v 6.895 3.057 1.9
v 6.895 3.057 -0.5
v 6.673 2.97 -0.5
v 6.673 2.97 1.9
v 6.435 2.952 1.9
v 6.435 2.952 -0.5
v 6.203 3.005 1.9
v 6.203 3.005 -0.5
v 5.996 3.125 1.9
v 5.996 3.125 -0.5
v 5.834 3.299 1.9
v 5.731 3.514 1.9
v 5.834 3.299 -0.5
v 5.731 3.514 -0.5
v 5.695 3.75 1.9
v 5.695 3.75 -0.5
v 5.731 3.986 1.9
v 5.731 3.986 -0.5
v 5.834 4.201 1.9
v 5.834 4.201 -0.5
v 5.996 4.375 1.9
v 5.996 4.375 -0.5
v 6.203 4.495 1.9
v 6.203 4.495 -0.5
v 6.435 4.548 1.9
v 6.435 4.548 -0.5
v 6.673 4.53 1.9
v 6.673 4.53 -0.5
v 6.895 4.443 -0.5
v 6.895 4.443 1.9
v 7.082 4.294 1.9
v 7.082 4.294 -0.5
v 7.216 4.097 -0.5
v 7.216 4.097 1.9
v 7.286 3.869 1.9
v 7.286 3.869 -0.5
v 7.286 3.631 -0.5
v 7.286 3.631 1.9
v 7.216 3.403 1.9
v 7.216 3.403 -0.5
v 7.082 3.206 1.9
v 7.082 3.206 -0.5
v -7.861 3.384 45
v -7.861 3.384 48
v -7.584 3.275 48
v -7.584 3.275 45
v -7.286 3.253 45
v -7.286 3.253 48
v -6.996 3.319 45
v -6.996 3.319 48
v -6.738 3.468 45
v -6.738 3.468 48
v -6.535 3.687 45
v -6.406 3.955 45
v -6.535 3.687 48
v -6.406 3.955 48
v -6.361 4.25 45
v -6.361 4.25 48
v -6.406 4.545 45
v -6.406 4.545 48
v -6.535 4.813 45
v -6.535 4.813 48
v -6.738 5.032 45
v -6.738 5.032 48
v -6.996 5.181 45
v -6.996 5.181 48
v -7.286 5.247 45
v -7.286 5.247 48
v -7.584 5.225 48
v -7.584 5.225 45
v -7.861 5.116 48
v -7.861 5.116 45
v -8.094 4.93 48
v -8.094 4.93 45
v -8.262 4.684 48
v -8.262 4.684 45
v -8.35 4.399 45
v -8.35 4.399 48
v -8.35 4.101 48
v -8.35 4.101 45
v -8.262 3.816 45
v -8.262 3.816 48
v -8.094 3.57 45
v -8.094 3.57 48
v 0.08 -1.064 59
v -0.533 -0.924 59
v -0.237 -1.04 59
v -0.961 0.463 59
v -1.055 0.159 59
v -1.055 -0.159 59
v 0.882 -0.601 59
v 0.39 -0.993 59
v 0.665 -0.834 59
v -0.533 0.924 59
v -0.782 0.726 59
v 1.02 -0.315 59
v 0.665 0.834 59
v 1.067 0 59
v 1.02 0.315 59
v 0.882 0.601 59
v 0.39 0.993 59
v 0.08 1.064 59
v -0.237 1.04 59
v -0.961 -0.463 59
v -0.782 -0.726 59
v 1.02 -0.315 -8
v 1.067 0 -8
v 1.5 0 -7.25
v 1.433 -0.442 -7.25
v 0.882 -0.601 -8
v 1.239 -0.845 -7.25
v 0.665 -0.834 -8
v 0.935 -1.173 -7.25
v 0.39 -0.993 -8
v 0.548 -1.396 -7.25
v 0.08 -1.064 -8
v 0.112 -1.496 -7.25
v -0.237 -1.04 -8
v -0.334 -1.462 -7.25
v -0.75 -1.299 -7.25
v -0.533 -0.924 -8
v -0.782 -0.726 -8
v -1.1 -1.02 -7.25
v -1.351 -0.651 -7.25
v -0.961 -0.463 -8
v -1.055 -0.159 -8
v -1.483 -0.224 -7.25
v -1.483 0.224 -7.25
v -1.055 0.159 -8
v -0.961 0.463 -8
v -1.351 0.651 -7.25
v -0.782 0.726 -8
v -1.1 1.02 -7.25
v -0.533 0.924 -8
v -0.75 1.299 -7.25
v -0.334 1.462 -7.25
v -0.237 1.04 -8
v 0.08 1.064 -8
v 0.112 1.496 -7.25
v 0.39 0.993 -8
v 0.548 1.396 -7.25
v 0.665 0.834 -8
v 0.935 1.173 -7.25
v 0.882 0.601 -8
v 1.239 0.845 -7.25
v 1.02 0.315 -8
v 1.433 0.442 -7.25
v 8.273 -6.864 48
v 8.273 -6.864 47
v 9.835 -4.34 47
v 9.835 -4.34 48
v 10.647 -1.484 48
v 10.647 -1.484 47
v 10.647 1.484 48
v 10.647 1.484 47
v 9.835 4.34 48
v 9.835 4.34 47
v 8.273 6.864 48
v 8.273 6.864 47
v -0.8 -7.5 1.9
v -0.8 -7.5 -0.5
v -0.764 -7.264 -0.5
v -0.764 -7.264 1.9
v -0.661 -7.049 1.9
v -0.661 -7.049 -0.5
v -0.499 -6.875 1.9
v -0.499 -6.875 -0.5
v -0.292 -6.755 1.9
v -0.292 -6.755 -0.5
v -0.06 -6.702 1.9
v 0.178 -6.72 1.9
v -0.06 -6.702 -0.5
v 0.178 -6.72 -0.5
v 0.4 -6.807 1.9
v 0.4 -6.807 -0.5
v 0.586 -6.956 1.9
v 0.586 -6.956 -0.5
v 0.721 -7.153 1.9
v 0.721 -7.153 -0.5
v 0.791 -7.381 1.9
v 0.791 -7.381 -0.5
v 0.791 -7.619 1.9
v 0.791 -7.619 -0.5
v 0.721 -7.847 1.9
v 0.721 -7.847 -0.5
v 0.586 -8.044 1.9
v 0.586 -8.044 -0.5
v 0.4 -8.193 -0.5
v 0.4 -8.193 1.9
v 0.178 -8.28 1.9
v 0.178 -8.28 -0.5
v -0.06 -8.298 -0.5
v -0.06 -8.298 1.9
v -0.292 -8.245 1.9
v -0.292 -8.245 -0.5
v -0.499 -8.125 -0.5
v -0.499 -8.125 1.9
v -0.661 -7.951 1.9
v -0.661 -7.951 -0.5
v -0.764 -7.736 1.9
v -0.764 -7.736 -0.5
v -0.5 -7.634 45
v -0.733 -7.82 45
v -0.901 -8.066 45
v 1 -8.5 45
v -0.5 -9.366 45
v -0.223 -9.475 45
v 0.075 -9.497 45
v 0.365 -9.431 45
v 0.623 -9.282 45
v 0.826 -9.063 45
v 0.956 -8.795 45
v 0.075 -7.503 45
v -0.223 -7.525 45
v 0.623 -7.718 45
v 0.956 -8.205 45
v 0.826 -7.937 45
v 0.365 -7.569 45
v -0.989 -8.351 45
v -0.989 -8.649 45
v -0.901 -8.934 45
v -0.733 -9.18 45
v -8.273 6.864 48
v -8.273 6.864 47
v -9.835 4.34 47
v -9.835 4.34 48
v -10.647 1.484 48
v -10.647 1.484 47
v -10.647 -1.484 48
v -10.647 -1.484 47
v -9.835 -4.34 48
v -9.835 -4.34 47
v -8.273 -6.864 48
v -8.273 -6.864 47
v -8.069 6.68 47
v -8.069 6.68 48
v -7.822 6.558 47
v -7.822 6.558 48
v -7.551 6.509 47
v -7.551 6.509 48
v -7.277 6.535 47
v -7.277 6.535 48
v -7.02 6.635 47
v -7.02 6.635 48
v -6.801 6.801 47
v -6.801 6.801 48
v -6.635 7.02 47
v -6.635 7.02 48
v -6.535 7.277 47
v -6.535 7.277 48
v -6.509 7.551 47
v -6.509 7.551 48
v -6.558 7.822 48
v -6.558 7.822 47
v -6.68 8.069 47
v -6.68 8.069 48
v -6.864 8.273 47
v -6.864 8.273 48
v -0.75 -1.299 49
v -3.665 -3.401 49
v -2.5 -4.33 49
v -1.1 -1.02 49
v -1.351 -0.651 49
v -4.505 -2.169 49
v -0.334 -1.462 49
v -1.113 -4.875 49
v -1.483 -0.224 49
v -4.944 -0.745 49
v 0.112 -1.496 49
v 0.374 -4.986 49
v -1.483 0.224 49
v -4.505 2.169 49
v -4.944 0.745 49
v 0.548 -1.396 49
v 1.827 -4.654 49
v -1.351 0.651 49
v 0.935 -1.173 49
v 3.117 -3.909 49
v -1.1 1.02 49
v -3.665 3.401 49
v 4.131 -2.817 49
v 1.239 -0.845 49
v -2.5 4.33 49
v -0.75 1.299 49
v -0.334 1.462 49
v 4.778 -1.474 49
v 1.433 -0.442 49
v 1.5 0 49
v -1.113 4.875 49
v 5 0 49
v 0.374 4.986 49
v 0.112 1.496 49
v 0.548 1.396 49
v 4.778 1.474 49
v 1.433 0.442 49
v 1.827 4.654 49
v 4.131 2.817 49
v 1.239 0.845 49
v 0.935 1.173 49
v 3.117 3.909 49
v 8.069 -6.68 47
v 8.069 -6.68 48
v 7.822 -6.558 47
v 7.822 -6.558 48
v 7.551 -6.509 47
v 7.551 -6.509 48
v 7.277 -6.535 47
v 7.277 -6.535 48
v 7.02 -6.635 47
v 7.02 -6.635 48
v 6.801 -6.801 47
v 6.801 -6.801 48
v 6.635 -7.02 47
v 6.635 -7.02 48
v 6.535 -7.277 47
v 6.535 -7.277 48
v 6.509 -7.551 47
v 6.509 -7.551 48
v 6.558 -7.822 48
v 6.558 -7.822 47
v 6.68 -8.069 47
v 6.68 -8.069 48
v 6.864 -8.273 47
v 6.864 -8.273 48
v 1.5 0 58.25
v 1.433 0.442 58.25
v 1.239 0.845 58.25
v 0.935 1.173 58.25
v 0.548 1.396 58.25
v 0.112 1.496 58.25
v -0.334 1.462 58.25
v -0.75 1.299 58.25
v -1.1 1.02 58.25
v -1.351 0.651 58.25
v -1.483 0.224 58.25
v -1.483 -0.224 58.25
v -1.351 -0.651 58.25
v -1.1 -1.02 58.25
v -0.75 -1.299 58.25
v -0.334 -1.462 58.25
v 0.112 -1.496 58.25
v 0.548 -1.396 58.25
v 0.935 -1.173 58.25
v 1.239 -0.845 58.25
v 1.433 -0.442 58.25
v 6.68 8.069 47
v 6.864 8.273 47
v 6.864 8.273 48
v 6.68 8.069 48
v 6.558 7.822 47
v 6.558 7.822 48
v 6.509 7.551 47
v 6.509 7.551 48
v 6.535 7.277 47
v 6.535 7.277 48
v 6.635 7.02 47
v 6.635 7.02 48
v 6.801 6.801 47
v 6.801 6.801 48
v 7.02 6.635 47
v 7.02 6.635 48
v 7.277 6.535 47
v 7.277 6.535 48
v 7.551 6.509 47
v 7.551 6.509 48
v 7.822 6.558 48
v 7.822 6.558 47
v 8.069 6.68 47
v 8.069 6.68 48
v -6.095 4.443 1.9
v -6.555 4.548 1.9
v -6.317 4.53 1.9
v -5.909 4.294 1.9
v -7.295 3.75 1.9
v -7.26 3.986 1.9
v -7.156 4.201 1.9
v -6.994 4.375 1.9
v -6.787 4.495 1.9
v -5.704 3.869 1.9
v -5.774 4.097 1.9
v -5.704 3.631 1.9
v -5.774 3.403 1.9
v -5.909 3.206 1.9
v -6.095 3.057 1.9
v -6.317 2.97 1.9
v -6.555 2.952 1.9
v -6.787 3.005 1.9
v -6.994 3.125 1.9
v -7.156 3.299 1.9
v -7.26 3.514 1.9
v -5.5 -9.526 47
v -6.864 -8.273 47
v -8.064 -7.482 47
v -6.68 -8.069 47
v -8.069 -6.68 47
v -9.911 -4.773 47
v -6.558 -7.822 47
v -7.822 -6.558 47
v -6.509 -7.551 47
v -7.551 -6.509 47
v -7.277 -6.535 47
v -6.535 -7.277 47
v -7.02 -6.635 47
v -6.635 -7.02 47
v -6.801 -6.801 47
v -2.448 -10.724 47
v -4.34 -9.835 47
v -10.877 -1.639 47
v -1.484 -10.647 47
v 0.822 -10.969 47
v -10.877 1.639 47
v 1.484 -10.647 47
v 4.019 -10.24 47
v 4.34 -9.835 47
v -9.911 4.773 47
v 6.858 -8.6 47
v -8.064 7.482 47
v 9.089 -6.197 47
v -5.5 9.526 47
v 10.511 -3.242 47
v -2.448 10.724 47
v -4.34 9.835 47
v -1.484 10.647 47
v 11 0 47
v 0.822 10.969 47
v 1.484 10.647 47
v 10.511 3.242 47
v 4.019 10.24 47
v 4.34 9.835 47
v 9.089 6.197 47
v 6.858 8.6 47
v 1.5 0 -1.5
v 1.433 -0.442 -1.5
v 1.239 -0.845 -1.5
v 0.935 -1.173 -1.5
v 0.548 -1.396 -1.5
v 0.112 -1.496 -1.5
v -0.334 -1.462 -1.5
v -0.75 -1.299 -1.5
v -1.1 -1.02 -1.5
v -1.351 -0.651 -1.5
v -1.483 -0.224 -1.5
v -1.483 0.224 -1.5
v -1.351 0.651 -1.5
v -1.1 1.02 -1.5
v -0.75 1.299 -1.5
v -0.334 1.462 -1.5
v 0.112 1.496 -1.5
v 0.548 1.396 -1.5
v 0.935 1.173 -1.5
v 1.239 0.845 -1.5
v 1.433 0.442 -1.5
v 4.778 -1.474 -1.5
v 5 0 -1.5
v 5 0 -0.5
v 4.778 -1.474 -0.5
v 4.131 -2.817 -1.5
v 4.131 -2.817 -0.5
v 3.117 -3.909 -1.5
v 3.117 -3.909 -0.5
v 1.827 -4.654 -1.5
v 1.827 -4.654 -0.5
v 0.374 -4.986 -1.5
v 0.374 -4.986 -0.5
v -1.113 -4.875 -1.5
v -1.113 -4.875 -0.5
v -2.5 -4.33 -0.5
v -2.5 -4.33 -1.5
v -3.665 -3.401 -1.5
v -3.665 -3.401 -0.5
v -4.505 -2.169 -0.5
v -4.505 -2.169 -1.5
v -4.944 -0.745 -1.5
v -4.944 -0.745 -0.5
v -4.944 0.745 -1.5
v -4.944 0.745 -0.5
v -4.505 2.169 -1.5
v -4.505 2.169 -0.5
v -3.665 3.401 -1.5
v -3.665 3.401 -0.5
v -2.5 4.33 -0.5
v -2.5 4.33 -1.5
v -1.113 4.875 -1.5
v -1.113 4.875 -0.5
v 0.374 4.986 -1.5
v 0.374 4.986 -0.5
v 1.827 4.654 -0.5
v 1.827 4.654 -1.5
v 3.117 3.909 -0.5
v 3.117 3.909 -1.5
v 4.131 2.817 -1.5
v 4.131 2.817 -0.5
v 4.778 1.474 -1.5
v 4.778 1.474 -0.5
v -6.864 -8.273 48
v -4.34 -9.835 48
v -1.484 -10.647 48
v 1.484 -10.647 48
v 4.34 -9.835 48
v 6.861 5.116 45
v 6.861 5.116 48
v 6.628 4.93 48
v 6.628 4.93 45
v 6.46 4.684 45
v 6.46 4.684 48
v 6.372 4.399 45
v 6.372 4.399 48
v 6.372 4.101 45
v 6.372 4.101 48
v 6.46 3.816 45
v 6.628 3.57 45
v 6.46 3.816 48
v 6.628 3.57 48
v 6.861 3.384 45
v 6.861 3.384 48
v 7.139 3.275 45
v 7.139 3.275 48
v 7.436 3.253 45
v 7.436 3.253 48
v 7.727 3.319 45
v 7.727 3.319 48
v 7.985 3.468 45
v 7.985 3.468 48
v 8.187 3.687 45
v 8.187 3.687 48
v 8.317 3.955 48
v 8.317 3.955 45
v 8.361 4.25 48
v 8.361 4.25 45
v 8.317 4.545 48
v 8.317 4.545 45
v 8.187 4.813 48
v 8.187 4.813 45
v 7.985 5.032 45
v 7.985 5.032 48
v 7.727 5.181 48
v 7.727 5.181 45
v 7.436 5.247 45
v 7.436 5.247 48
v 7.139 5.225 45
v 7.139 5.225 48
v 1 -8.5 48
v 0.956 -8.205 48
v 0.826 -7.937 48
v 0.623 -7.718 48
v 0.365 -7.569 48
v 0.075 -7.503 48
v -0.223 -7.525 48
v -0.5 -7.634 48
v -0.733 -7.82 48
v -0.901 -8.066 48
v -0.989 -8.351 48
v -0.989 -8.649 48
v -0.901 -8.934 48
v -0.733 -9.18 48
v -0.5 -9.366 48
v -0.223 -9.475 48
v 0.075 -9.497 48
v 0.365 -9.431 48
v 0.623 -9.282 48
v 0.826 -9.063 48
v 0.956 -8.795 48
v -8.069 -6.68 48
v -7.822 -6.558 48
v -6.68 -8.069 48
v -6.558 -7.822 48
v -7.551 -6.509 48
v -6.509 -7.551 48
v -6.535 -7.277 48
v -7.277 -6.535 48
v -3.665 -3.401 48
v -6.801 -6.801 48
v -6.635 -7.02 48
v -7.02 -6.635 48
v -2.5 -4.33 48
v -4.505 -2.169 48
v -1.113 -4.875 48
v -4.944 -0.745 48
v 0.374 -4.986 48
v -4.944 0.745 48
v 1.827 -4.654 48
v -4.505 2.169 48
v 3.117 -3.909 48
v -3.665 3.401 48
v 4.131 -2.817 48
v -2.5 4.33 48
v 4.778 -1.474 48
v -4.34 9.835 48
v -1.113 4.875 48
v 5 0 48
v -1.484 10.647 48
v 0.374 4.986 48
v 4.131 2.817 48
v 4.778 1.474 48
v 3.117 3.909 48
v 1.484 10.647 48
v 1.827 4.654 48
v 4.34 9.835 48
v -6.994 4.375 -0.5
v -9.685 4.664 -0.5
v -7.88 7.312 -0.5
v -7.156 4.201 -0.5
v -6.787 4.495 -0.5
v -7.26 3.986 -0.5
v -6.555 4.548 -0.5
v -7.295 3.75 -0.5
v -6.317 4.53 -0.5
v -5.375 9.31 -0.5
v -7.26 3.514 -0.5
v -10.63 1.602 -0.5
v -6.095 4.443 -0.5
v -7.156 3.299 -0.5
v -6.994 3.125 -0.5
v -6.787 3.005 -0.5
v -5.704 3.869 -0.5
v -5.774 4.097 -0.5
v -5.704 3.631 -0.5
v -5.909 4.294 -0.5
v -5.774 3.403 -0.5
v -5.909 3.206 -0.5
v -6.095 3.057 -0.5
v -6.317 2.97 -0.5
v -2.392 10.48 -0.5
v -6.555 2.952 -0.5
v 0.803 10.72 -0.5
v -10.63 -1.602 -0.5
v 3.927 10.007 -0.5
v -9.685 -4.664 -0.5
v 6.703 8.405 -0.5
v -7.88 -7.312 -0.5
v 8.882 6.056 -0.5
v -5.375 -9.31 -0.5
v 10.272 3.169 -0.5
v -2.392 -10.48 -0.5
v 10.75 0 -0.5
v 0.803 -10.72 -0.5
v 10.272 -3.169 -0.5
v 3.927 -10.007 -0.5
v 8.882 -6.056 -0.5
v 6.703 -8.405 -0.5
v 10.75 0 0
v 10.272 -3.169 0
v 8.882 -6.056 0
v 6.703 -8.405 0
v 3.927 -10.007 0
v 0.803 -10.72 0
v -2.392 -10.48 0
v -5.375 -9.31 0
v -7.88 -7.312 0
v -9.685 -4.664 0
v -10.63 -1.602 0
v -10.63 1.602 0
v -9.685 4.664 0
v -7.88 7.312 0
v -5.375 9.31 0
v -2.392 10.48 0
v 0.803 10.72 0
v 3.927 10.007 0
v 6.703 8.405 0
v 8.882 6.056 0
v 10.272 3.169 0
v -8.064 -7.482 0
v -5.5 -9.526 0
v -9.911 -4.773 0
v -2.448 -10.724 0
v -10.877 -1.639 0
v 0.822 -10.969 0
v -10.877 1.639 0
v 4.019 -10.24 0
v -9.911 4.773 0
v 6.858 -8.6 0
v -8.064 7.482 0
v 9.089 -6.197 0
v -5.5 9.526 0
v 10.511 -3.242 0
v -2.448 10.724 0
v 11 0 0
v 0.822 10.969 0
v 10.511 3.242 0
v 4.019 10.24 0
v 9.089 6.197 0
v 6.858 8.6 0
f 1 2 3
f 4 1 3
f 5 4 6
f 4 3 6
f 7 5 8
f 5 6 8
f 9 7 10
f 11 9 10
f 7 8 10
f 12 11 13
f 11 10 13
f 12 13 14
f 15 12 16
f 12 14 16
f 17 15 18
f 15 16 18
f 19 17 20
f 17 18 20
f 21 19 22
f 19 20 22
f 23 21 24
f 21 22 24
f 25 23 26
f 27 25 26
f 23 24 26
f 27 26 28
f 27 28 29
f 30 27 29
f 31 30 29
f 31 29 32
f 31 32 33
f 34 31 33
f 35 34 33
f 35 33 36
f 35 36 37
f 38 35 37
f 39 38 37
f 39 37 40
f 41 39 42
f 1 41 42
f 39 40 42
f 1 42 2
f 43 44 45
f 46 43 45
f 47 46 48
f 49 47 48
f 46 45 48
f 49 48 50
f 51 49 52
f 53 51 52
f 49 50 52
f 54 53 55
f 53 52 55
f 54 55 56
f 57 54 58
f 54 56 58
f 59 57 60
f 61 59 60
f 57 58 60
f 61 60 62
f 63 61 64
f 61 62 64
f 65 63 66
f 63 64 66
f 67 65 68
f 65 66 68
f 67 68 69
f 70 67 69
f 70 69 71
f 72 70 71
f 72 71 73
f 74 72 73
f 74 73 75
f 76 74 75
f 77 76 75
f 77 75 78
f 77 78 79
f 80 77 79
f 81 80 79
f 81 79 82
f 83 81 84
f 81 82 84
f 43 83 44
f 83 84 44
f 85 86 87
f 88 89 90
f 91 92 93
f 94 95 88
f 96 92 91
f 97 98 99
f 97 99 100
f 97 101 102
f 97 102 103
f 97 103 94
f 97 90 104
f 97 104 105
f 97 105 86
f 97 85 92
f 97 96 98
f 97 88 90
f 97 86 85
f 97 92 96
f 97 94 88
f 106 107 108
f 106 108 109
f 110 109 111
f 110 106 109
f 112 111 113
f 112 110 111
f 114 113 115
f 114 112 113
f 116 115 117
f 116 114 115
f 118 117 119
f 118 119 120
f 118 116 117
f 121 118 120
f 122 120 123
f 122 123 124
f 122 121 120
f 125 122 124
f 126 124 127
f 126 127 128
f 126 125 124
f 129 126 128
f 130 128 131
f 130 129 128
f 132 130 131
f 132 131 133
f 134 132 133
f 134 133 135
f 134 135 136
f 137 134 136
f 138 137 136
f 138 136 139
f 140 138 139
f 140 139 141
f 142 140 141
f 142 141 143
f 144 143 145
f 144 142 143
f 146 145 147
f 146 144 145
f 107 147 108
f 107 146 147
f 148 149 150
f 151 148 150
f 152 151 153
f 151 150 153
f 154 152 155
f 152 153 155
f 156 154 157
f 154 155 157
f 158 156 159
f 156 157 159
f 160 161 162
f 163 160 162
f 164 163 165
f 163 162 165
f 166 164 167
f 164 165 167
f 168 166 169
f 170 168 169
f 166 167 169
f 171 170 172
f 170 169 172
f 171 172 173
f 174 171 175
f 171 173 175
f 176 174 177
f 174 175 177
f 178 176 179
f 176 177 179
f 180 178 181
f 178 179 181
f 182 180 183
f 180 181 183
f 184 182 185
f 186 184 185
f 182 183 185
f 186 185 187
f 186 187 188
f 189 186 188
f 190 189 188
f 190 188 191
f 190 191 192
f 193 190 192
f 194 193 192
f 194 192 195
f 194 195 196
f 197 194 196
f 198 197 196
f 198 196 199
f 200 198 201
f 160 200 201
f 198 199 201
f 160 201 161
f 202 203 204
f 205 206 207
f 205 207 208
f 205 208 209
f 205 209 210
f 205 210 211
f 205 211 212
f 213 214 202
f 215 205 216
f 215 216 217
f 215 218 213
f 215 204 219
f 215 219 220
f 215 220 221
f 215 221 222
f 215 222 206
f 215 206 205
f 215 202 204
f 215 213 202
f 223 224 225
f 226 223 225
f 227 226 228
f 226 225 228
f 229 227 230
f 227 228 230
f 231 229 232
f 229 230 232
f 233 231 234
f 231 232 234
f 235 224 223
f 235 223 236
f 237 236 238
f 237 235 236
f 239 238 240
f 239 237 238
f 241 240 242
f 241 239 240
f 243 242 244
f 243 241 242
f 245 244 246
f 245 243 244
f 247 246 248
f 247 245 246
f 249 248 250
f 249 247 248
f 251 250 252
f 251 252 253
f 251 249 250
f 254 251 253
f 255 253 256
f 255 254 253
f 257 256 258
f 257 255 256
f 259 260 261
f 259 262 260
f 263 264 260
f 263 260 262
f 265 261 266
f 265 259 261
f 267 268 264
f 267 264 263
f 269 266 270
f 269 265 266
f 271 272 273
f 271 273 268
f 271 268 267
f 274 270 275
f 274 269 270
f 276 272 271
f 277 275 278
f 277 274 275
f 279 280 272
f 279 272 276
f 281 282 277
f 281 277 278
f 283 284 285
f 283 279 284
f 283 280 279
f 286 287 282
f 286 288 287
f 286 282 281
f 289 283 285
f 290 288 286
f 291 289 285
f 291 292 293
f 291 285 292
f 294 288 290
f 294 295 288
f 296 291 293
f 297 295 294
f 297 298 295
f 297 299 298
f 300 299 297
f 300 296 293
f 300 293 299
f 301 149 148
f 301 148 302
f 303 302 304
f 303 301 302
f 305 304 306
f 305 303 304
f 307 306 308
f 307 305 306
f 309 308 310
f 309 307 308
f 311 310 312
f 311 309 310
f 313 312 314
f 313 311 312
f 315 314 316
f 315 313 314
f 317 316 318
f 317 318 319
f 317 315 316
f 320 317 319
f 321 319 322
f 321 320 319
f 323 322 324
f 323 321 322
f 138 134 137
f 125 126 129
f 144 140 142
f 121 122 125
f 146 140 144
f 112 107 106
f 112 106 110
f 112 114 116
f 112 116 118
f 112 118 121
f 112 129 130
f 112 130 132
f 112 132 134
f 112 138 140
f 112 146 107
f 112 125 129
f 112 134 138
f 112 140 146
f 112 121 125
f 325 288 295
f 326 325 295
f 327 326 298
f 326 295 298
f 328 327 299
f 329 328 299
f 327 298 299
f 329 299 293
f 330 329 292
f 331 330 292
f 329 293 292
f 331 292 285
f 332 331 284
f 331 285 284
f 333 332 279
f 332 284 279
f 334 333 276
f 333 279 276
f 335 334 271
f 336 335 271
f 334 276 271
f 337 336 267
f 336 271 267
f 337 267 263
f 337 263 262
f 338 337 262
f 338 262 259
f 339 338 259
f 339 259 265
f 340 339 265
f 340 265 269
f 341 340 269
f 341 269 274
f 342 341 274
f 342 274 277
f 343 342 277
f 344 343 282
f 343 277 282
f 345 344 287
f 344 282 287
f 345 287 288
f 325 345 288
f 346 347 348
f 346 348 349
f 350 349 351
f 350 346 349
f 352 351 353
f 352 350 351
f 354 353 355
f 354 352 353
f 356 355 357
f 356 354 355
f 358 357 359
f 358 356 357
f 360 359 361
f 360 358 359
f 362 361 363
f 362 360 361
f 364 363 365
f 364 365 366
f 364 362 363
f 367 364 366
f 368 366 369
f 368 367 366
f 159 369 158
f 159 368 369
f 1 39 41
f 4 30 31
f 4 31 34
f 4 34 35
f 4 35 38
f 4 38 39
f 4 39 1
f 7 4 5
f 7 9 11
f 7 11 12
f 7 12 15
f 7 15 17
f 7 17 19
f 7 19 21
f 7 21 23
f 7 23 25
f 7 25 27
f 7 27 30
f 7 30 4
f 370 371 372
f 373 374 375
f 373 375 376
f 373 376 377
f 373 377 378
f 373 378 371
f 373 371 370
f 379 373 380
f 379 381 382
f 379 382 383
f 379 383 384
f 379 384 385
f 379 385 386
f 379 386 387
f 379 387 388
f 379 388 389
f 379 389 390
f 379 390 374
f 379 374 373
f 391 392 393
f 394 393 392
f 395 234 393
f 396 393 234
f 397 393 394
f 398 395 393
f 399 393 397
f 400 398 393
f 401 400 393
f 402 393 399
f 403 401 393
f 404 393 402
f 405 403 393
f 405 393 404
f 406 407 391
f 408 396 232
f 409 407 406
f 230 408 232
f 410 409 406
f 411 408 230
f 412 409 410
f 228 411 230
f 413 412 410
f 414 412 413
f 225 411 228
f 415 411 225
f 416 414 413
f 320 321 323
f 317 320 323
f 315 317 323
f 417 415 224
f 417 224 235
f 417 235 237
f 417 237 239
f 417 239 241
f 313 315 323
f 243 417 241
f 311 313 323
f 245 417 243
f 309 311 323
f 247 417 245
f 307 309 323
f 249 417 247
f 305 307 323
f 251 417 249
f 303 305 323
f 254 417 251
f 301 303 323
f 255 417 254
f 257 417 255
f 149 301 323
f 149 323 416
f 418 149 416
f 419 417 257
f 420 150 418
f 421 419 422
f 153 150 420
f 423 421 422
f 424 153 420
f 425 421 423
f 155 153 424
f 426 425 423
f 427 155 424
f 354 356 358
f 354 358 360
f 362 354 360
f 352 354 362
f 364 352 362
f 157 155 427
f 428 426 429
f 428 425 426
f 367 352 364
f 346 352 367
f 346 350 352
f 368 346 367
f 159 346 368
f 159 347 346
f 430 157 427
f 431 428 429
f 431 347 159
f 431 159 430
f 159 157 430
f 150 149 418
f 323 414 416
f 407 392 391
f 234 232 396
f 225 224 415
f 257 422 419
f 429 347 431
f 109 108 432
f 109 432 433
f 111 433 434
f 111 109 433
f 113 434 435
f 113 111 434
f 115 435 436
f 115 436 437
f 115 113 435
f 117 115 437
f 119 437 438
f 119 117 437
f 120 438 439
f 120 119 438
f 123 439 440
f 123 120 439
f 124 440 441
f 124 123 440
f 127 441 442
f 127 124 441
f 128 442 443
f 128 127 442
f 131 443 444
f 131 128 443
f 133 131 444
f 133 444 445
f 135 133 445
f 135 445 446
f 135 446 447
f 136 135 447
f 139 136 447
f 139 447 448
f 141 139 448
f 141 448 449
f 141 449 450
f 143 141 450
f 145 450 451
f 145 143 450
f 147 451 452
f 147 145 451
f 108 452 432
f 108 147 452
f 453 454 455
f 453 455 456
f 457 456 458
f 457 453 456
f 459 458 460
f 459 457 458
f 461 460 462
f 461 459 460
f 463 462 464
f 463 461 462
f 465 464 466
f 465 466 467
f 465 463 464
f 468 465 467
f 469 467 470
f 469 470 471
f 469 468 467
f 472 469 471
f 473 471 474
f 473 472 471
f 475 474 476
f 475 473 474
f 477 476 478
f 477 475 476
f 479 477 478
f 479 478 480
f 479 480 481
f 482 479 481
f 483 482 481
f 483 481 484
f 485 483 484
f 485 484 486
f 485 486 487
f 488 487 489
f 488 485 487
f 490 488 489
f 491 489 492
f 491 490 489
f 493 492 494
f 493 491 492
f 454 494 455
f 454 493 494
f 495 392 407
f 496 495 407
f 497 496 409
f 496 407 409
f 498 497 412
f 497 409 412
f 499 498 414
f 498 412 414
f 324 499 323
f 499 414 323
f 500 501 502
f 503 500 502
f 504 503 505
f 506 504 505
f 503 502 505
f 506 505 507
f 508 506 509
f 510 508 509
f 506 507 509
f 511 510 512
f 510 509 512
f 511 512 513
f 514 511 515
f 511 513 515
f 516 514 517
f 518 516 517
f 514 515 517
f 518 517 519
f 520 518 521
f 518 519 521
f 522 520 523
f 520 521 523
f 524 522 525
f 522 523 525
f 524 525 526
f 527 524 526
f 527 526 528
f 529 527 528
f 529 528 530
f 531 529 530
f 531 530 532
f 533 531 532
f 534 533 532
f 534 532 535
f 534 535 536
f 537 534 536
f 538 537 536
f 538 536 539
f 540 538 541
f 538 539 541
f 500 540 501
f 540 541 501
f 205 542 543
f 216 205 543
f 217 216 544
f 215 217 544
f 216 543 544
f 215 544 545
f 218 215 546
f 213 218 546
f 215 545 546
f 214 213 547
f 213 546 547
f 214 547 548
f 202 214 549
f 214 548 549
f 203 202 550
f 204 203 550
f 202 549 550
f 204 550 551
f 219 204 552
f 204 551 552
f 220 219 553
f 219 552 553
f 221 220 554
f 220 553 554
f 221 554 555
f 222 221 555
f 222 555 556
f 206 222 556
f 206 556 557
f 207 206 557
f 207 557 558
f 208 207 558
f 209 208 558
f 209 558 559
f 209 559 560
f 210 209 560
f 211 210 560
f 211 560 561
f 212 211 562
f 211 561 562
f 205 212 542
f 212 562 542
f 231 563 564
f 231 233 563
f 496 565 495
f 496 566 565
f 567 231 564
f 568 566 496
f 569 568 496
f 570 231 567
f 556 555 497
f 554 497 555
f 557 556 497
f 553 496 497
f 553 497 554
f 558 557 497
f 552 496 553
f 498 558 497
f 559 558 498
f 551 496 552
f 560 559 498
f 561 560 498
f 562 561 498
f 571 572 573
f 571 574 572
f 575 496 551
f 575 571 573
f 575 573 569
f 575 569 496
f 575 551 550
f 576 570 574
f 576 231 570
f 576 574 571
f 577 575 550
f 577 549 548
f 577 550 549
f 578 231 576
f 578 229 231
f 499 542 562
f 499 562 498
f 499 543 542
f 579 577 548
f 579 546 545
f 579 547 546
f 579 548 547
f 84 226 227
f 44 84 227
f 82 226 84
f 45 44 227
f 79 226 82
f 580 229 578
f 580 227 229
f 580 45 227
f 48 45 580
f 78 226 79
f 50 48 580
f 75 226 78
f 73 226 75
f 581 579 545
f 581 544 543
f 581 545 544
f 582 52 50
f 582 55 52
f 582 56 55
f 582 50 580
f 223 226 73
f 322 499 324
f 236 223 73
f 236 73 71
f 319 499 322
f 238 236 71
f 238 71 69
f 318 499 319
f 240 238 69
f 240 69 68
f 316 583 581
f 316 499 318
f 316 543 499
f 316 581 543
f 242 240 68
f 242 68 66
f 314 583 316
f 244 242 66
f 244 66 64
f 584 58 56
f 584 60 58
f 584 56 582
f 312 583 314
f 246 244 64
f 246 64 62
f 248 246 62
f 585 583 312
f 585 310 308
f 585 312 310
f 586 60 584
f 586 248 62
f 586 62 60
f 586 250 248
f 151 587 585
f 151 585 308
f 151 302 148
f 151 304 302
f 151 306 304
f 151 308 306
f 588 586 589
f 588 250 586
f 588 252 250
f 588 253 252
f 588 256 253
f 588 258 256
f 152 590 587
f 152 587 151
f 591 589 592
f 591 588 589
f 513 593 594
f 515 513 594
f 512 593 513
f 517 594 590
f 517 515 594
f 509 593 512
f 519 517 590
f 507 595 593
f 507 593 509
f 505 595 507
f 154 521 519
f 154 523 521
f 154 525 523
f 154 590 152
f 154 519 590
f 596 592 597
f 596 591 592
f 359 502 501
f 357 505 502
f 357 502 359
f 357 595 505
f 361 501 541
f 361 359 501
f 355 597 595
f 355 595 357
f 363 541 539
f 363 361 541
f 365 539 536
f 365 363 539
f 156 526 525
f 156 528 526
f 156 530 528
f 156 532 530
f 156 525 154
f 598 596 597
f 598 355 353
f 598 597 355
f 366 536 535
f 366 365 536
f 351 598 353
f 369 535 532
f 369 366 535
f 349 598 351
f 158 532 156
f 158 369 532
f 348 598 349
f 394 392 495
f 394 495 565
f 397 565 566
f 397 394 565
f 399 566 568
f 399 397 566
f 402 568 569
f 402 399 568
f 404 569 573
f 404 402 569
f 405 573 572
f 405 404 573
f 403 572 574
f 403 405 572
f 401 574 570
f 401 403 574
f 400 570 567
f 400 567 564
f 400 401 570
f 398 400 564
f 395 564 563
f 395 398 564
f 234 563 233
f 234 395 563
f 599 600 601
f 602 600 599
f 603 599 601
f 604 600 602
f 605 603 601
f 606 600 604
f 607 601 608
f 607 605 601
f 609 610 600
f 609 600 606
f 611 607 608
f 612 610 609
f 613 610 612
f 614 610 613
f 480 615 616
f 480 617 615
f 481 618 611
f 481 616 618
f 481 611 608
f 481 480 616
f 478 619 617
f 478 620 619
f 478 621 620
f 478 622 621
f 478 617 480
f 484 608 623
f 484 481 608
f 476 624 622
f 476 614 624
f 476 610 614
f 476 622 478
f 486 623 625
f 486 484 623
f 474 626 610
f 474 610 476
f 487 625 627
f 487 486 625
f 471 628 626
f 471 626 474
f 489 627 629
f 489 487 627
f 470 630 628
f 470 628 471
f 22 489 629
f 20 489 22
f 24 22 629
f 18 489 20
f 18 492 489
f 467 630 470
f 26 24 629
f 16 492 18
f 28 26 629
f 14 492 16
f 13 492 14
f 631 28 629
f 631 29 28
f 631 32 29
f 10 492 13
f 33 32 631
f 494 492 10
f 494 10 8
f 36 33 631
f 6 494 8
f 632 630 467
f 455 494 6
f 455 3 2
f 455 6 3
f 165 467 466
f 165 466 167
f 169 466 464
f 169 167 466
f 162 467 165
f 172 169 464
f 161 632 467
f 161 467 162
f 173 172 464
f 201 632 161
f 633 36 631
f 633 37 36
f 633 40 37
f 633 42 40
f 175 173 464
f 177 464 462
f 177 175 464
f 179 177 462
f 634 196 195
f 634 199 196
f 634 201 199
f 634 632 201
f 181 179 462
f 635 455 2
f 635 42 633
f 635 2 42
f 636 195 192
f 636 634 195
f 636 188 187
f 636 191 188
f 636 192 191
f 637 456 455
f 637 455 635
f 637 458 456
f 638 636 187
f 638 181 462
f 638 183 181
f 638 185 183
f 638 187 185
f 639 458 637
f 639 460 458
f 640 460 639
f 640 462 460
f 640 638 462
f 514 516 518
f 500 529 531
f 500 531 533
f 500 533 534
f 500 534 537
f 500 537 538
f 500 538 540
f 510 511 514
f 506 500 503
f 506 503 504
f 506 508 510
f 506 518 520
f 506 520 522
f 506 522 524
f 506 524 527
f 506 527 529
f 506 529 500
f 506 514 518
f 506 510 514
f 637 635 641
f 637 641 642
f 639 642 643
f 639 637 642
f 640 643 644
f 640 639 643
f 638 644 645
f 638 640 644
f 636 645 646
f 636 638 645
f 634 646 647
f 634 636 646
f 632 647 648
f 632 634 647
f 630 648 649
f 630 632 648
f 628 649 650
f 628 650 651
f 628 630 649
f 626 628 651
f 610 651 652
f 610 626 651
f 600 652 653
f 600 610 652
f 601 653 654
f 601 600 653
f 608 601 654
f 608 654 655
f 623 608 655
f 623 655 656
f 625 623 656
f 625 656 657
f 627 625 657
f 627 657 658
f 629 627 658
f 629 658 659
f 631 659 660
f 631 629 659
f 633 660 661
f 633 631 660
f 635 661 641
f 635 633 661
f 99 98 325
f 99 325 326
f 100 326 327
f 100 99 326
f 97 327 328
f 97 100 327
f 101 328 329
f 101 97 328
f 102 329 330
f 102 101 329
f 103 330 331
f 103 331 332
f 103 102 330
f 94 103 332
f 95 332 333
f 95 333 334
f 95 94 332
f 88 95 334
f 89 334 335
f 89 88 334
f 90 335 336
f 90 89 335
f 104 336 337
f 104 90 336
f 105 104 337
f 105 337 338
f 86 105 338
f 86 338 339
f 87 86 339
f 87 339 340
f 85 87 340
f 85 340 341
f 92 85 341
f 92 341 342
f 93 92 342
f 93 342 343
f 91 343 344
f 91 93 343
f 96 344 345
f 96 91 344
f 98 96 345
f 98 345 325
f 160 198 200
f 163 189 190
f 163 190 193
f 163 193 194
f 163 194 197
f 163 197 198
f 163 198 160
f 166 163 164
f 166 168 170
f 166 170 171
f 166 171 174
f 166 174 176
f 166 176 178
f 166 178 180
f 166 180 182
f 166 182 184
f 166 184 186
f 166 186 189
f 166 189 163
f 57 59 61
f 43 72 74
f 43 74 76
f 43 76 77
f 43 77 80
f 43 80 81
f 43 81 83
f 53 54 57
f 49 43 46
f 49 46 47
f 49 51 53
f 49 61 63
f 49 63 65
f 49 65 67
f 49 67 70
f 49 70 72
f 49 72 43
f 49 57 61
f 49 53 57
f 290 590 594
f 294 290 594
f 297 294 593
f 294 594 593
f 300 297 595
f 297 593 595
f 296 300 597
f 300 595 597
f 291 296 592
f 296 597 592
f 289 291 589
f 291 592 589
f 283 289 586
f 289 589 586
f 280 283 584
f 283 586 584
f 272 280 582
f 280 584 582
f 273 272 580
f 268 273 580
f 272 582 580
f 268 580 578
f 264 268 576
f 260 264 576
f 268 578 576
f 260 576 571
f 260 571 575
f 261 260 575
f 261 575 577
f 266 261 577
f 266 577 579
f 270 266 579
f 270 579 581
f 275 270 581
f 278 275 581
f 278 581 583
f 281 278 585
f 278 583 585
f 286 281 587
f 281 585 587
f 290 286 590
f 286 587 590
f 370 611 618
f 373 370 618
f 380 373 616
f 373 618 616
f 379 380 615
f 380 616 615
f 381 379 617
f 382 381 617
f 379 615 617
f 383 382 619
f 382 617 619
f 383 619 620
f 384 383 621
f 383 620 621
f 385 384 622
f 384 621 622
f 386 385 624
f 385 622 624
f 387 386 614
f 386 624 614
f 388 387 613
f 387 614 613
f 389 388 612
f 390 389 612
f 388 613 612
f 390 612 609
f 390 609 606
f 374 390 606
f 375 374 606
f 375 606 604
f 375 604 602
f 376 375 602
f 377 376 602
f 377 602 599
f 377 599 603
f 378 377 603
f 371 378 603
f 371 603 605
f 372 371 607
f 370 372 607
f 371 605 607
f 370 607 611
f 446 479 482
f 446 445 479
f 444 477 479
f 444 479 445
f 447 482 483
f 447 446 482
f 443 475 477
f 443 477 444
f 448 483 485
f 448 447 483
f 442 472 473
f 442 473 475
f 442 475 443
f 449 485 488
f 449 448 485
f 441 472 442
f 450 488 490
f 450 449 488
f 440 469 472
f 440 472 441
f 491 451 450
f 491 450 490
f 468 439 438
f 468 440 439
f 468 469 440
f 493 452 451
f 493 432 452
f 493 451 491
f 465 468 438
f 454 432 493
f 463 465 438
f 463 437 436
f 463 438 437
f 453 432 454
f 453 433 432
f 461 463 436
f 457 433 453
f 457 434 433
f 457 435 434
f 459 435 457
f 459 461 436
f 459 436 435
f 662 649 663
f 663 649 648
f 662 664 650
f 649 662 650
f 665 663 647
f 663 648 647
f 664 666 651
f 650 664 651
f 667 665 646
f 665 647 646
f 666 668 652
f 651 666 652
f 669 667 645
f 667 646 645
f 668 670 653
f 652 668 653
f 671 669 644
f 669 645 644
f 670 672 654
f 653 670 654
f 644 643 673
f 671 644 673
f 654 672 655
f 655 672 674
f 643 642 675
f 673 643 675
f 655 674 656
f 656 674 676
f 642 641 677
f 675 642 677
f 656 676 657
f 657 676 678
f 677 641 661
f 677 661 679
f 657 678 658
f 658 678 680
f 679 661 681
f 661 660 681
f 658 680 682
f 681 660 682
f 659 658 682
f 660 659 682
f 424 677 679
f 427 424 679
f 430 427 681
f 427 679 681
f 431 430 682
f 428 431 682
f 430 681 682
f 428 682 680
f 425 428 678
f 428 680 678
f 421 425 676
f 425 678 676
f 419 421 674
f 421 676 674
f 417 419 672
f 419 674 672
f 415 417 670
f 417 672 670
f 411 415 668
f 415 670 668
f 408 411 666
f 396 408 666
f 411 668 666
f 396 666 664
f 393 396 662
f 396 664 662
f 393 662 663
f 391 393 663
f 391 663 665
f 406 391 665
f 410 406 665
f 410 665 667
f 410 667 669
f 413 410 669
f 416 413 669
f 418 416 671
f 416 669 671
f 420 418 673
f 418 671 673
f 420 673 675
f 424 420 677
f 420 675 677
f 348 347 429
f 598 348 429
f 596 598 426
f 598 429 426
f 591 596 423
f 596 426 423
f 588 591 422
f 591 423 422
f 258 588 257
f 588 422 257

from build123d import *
from OCP.BRepFilletAPI import BRepFilletAPI_MakeChamfer

# Parameters (mm, degrees)
SKETCH1_R         = 11
EXTRUDE1_DEPTH    = 47
SKETCH2_R         = 10.75
EXTRUDE2_DEPTH    = 1
EXTRUDE3_START    = 0.5
SKETCH3_R         = 10.75
EXTRUDE3_DEPTH    = 0.5
SKETCH4_R         = 5
EXTRUDE4_DEPTH    = 1
EXTRUDE5_START    = 1
SKETCH5_R         = 5
EXTRUDE5_DEPTH    = 1
SKETCH6_R         = 1.5
EXTRUDE6_DEPTH    = 10
EXTRUDE7_START    = 6.5
SKETCH7_R         = 1.5
EXTRUDE7_DEPTH    = 6.5
CHAMFER1_SIZE     = 0.75
CHAMFER1_SIZE2    = 0.433012702
SKETCH8_R         = 1
EXTRUDE8_DEPTH    = 3
CIRPATTERN1_COUNT = 3
SKETCH9_R         = 0.8
EXTRUDE9_DEPTH    = 2.4
CIRPATTERN2_COUNT = 3
EXTRUDE10_START   = -1
EXTRUDE10_DEPTH   = 1
CIRPATTERN3_COUNT = 4


with BuildPart() as part:
    # Sketch1 → Extrude1 (new body)
    with BuildSketch(Plane.XY):
        Circle(SKETCH1_R)
    extrude(amount=EXTRUDE1_DEPTH)

    # Sketch2 → Extrude2 (add)
    with BuildSketch(Plane.XY.offset(47)):
        Circle(SKETCH2_R)
    extrude(amount=EXTRUDE2_DEPTH)

    # Sketch3 → Extrude3 (add)
    with BuildSketch(Plane(origin=(0, 0, 0), x_dir=(-1, 0, 0), z_dir=(0, 0, -1)).offset(EXTRUDE3_START)):
        with Locations(Location((0, 0, 0), (0, 0, 180))):
            Circle(SKETCH3_R)
    extrude(amount=-EXTRUDE3_DEPTH)

    # Sketch4 → Extrude4 (add)
    with BuildSketch(Plane.XY.offset(48)):
        Circle(SKETCH4_R)
    extrude(amount=EXTRUDE4_DEPTH)

    # Sketch5 → Extrude5 (add)
    with BuildSketch(Plane(origin=(0, 0, -0.5), x_dir=(-1, 0, 0), z_dir=(0, 0, -1)).offset(EXTRUDE5_START)):
        with Locations(Location((0, 0, 0), (0, 0, 180))):
            Circle(SKETCH5_R)
    extrude(amount=-EXTRUDE5_DEPTH)

    # Sketch6 → Extrude6 (add)
    with BuildSketch(Plane.XY.offset(49)):
        Circle(SKETCH6_R)
    extrude(amount=EXTRUDE6_DEPTH)

    # Sketch7 → Extrude7 (add)
    with BuildSketch(Plane(origin=(0, 0, -1.5), x_dir=(-1, 0, 0), z_dir=(0, 0, -1)).offset(EXTRUDE7_START)):
        with Locations(Location((0, 0, 0), (0, 0, 180))):
            Circle(SKETCH7_R)
    extrude(amount=-EXTRUDE7_DEPTH)

    # Chamfer1: one chamfer whose edges measure the first distance from different faces: ONE call of the kernel's chamfer builder (chamfer() names one face for all edges)
    chamfer1_edges_1 = [part.edges().sort_by_distance(p)[0] for p in [
        (-1.5, 0, 59),
    ]]
    chamfer1_side_1 = [part.faces().sort_by_distance(p)[0] for p in [
        (-1.5, 0, 54),
    ]]
    chamfer1_edges_2 = [part.edges().sort_by_distance(p)[0] for p in [
        (-1.5, 0, -8),
    ]]
    chamfer1_side_2 = [part.faces().sort_by_distance(p)[0] for p in [
        (-1.5, 0, -4.75),
    ]]
    chamfer1 = BRepFilletAPI_MakeChamfer(part.part.solid().wrapped)
    for e in chamfer1_edges_1:
        chamfer1.Add(CHAMFER1_SIZE, CHAMFER1_SIZE2, e.wrapped, chamfer1_side_1[0].wrapped)  # the first distance lies on this face
    for e in chamfer1_edges_2:
        chamfer1.Add(CHAMFER1_SIZE, CHAMFER1_SIZE2, e.wrapped, chamfer1_side_2[0].wrapped)  # the first distance lies on this face
    add(Compound.cast(chamfer1.Shape()), mode=Mode.REPLACE)

    # Sketch8 → Extrude8 (cut)
    with BuildSketch(Plane.XY.offset(48)):
        with Locations((0, -8.5)):
            Circle(SKETCH8_R)
    extrude8 = extrude(amount=-EXTRUDE8_DEPTH, mode=Mode.SUBTRACT)

    # CirPattern1: Extrude8 ×3 about axis
    cirpattern1_axis = Axis((0, 0, 0), (0, 0, 1))
    for i in range(1, CIRPATTERN1_COUNT):
        add(extrude8.rotate(cirpattern1_axis, i * 360 / CIRPATTERN1_COUNT), mode=Mode.SUBTRACT)

    # Sketch9 → Extrude9 (cut)
    with BuildSketch(Plane(origin=(0, 0, -0.5), x_dir=(-1, 0, 0), z_dir=(0, 0, -1))):
        with Locations((0, -7.5)):
            Circle(SKETCH9_R)
    extrude9 = extrude(amount=-EXTRUDE9_DEPTH, mode=Mode.SUBTRACT)

    # CirPattern2: Extrude9 ×3 about axis
    cirpattern2_axis = Axis((0, 0, 0), (0, 0, 1))
    for i in range(1, CIRPATTERN2_COUNT):
        add(extrude9.rotate(cirpattern2_axis, i * 360 / CIRPATTERN2_COUNT), mode=Mode.SUBTRACT)

    # Sketch11 → Extrude10 (cut)
    with BuildSketch(Plane.XY.offset(48).offset(EXTRUDE10_START)):
        with BuildLine():
            ThreePointArc((6.864194516, 8.273169505), (6.800769225, 6.800769225), (8.273169505, 6.864194516))
            ThreePointArc((8.273169505, 6.864194516), (7.601397898, 7.601397898), (6.864194516, 8.273169505))
        make_face()
    extrude10 = extrude(amount=EXTRUDE10_DEPTH, mode=Mode.SUBTRACT)

    # CirPattern3: Extrude10 ×4 about axis
    cirpattern3_axis = Axis((0, 0, 0), (0, 0, 1))
    for i in range(1, CIRPATTERN3_COUNT):
        add(extrude10.rotate(cirpattern3_axis, i * 360 / CIRPATTERN3_COUNT), mode=Mode.SUBTRACT)


solid = part.part
